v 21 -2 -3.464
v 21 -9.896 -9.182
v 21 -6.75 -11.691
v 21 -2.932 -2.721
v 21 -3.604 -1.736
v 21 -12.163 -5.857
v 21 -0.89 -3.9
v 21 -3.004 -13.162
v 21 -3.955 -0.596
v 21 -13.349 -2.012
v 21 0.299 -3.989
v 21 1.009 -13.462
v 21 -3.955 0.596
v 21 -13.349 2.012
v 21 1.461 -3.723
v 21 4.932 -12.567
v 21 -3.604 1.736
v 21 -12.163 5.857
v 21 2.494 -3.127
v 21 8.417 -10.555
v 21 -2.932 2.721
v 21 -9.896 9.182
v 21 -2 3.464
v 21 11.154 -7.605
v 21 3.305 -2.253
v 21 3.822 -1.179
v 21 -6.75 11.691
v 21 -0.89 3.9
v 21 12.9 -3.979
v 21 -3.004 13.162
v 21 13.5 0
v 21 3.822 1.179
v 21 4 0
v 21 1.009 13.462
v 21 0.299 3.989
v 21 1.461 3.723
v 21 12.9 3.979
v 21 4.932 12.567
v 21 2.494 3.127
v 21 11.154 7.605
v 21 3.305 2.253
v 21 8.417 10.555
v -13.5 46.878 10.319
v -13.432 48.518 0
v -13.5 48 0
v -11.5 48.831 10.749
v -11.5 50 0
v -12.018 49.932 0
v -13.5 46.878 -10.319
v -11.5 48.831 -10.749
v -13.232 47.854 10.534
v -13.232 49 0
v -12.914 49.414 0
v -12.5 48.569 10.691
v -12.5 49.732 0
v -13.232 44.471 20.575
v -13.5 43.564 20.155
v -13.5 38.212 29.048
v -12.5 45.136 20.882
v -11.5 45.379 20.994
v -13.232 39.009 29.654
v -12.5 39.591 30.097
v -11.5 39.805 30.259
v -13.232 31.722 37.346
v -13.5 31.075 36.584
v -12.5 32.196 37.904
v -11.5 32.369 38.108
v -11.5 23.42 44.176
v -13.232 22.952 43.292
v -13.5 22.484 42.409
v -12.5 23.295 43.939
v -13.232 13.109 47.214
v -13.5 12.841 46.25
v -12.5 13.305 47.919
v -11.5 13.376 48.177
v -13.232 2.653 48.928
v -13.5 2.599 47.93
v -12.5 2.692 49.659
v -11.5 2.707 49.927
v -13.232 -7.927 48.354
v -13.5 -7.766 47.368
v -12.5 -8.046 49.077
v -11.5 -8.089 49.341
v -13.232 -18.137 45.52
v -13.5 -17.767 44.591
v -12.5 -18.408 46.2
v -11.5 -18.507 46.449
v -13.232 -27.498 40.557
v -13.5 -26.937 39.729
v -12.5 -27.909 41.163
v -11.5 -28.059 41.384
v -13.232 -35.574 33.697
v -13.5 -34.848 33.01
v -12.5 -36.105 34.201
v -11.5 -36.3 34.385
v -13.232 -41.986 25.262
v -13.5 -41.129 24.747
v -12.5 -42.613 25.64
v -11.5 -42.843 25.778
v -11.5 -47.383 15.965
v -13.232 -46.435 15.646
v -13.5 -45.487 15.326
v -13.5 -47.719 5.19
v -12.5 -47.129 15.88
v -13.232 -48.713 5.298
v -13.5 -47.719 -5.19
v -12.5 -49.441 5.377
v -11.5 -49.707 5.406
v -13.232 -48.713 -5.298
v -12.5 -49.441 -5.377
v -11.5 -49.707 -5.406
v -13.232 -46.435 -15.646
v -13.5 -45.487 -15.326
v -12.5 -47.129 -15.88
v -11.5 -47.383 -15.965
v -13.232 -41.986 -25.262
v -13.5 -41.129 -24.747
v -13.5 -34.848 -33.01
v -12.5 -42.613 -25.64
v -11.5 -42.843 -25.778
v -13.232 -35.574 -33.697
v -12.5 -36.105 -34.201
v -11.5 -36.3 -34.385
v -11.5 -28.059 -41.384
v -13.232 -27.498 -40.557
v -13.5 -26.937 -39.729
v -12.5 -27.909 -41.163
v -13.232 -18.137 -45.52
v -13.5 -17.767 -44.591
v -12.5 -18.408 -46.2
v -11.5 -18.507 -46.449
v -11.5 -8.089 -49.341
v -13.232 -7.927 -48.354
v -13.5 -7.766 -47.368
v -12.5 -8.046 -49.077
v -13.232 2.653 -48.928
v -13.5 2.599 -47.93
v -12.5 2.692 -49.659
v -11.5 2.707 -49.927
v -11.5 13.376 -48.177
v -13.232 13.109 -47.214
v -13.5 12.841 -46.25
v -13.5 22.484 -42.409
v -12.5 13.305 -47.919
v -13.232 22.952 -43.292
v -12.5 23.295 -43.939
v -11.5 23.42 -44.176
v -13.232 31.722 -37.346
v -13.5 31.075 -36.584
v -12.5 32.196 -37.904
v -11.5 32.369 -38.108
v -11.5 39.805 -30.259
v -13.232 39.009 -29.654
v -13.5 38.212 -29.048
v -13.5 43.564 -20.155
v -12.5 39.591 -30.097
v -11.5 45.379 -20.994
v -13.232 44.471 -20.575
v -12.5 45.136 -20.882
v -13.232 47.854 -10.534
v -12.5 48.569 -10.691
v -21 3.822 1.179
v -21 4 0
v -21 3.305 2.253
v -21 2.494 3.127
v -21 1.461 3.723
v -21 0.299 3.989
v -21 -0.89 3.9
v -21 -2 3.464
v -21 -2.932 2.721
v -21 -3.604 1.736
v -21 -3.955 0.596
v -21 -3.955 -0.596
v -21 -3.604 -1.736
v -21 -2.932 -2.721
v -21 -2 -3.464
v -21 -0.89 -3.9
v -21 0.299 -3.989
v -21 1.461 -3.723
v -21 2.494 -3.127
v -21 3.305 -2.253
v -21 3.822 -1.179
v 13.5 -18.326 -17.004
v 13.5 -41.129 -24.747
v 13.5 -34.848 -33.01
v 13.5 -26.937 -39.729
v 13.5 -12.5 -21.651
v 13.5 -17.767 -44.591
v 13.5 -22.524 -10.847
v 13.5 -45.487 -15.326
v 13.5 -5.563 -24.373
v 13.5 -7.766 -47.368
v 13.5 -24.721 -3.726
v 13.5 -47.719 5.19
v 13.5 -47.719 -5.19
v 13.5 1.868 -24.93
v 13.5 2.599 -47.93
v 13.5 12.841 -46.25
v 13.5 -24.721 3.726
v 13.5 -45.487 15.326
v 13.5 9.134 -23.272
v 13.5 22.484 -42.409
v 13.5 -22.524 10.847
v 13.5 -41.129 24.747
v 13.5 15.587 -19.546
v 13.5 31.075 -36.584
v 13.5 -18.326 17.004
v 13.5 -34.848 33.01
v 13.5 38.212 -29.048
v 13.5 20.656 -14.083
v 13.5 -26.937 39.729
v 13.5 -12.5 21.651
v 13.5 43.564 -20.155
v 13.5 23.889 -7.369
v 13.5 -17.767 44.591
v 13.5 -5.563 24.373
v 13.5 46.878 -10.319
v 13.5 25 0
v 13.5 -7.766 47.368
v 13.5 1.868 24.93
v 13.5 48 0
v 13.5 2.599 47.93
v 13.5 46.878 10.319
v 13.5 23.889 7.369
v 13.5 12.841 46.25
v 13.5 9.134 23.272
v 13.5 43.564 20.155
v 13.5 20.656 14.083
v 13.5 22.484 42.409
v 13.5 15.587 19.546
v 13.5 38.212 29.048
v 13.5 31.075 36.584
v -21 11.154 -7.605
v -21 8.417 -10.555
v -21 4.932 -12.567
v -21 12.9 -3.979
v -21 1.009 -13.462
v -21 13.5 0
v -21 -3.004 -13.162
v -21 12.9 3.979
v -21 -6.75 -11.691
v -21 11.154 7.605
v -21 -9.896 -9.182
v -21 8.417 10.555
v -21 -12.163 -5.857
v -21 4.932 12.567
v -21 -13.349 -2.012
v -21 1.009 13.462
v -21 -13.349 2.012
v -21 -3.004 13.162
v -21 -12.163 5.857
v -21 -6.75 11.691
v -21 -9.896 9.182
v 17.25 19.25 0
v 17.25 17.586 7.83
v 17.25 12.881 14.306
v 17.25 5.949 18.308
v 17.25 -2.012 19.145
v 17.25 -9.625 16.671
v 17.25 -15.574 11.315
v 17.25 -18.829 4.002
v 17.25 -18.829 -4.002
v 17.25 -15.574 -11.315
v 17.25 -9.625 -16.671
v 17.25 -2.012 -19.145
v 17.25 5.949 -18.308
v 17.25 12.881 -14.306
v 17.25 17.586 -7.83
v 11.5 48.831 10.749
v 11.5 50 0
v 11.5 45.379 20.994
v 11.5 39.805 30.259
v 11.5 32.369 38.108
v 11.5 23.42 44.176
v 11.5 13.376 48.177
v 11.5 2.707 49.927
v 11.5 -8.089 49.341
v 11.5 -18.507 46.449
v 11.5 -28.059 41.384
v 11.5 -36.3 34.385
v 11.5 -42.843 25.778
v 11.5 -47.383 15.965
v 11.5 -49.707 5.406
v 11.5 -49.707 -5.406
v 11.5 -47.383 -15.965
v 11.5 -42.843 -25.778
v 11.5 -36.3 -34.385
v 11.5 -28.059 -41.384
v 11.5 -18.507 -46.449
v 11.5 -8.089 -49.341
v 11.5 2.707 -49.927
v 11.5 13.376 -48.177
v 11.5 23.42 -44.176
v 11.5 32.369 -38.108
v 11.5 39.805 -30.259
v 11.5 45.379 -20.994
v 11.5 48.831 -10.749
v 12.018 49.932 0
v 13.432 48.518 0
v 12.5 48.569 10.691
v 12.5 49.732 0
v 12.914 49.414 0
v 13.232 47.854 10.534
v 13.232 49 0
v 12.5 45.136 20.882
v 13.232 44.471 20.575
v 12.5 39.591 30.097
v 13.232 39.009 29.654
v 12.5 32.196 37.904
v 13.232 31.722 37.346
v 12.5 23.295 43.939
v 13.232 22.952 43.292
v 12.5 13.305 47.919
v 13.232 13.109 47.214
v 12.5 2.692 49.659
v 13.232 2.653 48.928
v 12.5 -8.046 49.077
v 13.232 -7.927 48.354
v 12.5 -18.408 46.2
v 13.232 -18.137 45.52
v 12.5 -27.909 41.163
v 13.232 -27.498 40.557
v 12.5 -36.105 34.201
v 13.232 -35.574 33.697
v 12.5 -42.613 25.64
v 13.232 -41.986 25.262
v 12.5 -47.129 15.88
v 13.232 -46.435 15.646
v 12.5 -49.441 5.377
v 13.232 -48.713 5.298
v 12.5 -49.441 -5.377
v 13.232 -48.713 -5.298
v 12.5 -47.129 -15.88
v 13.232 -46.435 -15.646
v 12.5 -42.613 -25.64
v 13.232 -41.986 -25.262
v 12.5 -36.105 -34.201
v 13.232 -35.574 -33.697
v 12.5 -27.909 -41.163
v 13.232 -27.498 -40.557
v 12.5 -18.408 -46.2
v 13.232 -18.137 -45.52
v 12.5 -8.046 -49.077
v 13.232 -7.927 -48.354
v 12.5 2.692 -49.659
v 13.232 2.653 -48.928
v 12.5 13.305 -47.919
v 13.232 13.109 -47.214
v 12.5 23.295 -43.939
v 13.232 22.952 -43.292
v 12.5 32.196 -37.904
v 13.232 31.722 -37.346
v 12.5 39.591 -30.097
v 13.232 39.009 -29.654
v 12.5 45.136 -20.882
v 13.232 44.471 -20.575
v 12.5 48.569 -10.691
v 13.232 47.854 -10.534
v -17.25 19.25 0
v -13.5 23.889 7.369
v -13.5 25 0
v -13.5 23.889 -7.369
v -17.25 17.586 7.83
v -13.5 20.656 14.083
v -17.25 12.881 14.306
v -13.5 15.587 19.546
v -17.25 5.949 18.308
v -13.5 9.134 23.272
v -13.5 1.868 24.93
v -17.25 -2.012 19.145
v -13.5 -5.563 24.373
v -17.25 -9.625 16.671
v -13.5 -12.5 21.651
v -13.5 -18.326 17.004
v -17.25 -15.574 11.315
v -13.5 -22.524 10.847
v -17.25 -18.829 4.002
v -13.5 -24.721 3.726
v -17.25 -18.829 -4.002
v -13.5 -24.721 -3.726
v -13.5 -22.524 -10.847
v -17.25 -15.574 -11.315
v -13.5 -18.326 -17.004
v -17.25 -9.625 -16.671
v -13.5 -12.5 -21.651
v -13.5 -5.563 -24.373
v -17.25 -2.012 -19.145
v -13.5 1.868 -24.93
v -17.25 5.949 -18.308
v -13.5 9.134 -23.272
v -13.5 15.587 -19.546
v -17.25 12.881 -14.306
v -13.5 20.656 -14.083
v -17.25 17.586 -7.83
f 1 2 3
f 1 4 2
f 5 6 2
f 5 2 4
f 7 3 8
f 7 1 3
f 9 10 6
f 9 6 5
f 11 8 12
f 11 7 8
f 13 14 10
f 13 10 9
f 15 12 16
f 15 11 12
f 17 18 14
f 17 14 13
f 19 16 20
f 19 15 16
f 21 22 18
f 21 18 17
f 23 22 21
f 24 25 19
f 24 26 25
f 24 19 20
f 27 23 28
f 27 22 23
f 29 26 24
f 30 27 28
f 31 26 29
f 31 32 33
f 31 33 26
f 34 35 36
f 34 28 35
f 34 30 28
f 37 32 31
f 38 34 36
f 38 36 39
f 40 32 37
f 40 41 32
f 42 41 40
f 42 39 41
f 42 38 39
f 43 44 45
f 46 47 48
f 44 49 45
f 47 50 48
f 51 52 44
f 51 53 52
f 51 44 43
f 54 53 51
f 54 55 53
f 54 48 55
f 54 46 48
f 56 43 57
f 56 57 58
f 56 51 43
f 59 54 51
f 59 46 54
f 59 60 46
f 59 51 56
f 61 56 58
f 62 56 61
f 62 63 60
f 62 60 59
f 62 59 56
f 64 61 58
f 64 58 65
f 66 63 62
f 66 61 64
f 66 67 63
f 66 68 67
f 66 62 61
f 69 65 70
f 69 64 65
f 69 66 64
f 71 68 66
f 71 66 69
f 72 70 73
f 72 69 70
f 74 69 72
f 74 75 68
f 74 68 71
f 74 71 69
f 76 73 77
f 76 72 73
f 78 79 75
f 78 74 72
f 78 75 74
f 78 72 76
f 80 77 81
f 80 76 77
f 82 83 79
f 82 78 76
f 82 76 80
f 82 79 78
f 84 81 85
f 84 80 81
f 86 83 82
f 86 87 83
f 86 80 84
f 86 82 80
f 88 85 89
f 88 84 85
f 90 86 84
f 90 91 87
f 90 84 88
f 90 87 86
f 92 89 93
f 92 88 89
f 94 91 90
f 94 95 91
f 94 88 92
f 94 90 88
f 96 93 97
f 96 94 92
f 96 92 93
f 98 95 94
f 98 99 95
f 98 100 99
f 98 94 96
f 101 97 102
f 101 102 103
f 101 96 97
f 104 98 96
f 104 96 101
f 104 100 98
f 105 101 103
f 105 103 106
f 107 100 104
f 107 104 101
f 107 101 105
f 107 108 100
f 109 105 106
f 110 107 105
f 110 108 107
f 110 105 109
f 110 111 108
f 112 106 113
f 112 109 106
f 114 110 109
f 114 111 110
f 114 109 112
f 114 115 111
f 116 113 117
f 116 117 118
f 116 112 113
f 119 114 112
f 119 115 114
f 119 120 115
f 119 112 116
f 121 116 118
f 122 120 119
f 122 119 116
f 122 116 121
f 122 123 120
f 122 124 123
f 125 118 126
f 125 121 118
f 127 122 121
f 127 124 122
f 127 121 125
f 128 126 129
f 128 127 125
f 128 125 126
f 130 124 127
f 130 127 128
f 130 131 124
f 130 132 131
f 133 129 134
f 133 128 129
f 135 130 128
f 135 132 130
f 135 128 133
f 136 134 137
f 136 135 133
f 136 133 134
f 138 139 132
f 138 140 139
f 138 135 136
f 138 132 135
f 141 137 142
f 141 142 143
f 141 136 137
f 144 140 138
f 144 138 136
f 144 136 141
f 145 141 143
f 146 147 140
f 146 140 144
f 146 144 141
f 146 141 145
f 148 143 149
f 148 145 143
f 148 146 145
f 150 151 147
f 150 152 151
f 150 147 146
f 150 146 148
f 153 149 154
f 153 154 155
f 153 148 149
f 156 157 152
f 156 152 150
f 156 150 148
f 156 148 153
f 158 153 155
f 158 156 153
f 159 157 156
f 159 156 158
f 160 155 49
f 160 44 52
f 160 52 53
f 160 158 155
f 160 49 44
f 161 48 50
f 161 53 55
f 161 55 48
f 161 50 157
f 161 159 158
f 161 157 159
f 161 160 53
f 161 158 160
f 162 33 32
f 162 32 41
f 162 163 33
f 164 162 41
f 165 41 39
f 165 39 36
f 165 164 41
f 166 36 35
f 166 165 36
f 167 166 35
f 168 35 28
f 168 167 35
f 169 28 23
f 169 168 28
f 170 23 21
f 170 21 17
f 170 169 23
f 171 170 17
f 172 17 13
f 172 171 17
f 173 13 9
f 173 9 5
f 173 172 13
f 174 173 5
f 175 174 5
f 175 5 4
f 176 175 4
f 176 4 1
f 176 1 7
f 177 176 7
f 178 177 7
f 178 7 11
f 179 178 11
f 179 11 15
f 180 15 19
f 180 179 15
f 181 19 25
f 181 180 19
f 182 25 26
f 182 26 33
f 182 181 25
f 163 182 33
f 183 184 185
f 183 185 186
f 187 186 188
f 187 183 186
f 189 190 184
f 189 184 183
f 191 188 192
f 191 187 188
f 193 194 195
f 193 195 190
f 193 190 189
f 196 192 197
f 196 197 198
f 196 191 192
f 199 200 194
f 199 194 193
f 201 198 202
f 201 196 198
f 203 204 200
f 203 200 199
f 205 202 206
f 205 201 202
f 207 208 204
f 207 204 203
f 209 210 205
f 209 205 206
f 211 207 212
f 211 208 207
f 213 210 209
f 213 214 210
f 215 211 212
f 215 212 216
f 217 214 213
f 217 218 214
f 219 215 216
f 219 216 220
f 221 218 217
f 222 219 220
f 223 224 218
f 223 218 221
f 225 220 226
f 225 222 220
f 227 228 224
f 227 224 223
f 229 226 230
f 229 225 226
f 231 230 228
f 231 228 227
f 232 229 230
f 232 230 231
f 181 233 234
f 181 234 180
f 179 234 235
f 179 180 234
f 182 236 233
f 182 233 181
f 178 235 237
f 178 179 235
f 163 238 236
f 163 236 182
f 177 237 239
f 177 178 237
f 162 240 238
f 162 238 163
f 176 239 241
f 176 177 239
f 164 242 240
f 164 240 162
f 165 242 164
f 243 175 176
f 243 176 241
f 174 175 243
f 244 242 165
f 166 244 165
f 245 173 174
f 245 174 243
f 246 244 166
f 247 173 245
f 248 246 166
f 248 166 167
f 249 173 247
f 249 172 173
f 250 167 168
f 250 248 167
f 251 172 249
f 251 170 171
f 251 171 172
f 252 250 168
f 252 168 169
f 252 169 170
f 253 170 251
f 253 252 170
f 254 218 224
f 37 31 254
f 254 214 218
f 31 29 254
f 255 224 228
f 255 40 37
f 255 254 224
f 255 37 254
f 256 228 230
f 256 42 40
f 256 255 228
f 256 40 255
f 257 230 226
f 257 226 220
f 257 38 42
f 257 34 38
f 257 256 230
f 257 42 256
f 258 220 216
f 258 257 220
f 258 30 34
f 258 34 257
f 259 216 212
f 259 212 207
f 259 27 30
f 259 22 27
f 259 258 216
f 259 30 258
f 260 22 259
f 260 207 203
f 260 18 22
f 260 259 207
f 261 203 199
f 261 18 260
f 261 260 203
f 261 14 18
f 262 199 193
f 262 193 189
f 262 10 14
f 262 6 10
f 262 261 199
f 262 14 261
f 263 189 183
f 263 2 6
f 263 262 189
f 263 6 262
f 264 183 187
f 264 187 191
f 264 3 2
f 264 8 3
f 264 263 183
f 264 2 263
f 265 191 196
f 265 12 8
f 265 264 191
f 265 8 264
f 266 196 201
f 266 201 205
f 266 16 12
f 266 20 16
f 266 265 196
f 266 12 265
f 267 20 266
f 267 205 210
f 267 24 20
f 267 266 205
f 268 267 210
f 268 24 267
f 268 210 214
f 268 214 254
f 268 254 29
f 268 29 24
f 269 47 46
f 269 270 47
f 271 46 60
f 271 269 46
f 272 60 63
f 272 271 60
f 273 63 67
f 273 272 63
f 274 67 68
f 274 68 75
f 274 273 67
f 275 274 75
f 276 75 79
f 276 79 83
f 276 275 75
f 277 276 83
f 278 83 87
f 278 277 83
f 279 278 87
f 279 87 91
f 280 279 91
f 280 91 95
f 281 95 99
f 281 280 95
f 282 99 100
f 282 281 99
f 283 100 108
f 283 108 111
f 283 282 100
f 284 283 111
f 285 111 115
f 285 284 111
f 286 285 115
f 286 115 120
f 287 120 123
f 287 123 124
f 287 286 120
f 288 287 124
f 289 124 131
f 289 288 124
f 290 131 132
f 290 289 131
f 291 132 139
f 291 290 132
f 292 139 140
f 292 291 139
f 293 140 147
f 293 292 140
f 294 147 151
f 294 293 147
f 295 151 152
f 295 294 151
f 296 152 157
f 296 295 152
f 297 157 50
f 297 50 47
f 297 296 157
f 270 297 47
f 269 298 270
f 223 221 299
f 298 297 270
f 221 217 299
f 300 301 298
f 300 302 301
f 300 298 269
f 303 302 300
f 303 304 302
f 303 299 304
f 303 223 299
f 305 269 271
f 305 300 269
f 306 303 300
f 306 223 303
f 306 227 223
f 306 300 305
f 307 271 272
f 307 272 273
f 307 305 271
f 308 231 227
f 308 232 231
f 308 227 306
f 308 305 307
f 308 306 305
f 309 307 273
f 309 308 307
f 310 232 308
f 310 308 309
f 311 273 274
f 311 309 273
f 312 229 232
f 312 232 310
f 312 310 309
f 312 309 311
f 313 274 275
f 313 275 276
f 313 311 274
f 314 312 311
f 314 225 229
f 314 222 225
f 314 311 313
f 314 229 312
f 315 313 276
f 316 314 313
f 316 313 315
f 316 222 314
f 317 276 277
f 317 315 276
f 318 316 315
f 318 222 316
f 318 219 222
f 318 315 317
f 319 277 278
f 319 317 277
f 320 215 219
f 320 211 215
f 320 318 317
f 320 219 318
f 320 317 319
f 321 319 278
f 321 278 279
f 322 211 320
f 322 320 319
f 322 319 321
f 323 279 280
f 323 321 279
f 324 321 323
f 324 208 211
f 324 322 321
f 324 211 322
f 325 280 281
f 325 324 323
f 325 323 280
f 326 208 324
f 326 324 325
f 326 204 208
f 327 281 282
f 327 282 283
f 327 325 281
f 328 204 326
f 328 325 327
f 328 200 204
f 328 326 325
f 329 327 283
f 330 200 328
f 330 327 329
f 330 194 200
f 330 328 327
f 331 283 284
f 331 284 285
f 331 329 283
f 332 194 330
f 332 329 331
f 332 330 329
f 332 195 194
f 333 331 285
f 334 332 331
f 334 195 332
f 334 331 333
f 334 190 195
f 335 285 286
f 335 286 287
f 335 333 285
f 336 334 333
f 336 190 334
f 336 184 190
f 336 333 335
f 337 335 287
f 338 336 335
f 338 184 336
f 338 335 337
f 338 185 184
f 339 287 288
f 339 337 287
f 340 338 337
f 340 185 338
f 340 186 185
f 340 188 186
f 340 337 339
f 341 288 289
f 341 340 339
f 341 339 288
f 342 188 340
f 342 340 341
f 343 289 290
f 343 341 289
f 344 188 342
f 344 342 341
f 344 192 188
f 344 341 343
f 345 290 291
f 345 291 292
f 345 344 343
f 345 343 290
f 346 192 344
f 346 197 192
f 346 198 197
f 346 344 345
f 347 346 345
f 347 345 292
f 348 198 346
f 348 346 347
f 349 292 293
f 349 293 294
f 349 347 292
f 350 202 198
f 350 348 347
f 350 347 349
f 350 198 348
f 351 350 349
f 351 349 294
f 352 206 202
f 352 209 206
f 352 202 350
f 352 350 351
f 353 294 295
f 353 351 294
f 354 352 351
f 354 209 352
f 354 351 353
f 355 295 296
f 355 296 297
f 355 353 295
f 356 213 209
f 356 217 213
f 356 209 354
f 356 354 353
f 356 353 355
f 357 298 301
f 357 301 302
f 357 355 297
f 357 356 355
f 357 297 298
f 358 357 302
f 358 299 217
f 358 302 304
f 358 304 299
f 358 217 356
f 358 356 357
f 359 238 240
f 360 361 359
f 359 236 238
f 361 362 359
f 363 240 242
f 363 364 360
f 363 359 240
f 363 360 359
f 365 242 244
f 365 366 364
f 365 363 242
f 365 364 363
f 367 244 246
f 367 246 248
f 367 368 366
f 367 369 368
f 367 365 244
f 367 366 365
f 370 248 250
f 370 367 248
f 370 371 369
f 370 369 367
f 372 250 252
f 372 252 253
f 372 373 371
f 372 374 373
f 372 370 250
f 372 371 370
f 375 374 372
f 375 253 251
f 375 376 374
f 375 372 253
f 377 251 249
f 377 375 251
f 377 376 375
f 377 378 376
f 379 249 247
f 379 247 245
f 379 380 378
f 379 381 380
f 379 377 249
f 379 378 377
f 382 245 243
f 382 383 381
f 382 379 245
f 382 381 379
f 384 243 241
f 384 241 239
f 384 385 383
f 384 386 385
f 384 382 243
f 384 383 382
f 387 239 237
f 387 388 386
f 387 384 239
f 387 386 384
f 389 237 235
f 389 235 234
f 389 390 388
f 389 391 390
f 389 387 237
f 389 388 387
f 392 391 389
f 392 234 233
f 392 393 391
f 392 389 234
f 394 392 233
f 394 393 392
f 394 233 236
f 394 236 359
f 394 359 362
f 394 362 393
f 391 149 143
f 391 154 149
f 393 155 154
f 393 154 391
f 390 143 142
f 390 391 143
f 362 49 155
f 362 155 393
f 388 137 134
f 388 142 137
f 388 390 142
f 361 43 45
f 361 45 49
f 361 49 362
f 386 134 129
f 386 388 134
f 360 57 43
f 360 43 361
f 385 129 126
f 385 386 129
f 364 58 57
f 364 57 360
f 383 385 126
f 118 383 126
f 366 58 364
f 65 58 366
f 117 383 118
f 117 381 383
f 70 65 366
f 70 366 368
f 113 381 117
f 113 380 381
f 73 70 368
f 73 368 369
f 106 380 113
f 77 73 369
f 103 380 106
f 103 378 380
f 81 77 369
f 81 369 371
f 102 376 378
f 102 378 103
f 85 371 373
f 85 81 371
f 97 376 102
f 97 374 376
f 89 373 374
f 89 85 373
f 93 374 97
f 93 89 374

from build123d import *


with BuildPart() as part:
    # Эскиз1 → Повернуть1 (revolve)
    with BuildSketch(Plane.XY):
        with BuildLine():
            Line((21, 4), (-21, 4))
            Line((-21, 4), (-21, 13.5))
            Line((-21, 13.5), (-13.5, 25))
            Line((-13.5, 25), (-13.5, 48))
            ThreePointArc((-13.5, 48), (-12.914213562, 49.414213562), (-11.5, 50))
            Line((-11.5, 50), (11.5, 50))
            ThreePointArc((11.5, 50), (12.914213562, 49.414213562), (13.5, 48))
            Line((13.5, 48), (13.5, 25))
            Line((13.5, 25), (21, 13.5))
            Line((21, 13.5), (21, 4))
        make_face()
    revolve(axis=Axis((-557.663253442, 0, 0), (1, 0, 0)))


solid = part.part
